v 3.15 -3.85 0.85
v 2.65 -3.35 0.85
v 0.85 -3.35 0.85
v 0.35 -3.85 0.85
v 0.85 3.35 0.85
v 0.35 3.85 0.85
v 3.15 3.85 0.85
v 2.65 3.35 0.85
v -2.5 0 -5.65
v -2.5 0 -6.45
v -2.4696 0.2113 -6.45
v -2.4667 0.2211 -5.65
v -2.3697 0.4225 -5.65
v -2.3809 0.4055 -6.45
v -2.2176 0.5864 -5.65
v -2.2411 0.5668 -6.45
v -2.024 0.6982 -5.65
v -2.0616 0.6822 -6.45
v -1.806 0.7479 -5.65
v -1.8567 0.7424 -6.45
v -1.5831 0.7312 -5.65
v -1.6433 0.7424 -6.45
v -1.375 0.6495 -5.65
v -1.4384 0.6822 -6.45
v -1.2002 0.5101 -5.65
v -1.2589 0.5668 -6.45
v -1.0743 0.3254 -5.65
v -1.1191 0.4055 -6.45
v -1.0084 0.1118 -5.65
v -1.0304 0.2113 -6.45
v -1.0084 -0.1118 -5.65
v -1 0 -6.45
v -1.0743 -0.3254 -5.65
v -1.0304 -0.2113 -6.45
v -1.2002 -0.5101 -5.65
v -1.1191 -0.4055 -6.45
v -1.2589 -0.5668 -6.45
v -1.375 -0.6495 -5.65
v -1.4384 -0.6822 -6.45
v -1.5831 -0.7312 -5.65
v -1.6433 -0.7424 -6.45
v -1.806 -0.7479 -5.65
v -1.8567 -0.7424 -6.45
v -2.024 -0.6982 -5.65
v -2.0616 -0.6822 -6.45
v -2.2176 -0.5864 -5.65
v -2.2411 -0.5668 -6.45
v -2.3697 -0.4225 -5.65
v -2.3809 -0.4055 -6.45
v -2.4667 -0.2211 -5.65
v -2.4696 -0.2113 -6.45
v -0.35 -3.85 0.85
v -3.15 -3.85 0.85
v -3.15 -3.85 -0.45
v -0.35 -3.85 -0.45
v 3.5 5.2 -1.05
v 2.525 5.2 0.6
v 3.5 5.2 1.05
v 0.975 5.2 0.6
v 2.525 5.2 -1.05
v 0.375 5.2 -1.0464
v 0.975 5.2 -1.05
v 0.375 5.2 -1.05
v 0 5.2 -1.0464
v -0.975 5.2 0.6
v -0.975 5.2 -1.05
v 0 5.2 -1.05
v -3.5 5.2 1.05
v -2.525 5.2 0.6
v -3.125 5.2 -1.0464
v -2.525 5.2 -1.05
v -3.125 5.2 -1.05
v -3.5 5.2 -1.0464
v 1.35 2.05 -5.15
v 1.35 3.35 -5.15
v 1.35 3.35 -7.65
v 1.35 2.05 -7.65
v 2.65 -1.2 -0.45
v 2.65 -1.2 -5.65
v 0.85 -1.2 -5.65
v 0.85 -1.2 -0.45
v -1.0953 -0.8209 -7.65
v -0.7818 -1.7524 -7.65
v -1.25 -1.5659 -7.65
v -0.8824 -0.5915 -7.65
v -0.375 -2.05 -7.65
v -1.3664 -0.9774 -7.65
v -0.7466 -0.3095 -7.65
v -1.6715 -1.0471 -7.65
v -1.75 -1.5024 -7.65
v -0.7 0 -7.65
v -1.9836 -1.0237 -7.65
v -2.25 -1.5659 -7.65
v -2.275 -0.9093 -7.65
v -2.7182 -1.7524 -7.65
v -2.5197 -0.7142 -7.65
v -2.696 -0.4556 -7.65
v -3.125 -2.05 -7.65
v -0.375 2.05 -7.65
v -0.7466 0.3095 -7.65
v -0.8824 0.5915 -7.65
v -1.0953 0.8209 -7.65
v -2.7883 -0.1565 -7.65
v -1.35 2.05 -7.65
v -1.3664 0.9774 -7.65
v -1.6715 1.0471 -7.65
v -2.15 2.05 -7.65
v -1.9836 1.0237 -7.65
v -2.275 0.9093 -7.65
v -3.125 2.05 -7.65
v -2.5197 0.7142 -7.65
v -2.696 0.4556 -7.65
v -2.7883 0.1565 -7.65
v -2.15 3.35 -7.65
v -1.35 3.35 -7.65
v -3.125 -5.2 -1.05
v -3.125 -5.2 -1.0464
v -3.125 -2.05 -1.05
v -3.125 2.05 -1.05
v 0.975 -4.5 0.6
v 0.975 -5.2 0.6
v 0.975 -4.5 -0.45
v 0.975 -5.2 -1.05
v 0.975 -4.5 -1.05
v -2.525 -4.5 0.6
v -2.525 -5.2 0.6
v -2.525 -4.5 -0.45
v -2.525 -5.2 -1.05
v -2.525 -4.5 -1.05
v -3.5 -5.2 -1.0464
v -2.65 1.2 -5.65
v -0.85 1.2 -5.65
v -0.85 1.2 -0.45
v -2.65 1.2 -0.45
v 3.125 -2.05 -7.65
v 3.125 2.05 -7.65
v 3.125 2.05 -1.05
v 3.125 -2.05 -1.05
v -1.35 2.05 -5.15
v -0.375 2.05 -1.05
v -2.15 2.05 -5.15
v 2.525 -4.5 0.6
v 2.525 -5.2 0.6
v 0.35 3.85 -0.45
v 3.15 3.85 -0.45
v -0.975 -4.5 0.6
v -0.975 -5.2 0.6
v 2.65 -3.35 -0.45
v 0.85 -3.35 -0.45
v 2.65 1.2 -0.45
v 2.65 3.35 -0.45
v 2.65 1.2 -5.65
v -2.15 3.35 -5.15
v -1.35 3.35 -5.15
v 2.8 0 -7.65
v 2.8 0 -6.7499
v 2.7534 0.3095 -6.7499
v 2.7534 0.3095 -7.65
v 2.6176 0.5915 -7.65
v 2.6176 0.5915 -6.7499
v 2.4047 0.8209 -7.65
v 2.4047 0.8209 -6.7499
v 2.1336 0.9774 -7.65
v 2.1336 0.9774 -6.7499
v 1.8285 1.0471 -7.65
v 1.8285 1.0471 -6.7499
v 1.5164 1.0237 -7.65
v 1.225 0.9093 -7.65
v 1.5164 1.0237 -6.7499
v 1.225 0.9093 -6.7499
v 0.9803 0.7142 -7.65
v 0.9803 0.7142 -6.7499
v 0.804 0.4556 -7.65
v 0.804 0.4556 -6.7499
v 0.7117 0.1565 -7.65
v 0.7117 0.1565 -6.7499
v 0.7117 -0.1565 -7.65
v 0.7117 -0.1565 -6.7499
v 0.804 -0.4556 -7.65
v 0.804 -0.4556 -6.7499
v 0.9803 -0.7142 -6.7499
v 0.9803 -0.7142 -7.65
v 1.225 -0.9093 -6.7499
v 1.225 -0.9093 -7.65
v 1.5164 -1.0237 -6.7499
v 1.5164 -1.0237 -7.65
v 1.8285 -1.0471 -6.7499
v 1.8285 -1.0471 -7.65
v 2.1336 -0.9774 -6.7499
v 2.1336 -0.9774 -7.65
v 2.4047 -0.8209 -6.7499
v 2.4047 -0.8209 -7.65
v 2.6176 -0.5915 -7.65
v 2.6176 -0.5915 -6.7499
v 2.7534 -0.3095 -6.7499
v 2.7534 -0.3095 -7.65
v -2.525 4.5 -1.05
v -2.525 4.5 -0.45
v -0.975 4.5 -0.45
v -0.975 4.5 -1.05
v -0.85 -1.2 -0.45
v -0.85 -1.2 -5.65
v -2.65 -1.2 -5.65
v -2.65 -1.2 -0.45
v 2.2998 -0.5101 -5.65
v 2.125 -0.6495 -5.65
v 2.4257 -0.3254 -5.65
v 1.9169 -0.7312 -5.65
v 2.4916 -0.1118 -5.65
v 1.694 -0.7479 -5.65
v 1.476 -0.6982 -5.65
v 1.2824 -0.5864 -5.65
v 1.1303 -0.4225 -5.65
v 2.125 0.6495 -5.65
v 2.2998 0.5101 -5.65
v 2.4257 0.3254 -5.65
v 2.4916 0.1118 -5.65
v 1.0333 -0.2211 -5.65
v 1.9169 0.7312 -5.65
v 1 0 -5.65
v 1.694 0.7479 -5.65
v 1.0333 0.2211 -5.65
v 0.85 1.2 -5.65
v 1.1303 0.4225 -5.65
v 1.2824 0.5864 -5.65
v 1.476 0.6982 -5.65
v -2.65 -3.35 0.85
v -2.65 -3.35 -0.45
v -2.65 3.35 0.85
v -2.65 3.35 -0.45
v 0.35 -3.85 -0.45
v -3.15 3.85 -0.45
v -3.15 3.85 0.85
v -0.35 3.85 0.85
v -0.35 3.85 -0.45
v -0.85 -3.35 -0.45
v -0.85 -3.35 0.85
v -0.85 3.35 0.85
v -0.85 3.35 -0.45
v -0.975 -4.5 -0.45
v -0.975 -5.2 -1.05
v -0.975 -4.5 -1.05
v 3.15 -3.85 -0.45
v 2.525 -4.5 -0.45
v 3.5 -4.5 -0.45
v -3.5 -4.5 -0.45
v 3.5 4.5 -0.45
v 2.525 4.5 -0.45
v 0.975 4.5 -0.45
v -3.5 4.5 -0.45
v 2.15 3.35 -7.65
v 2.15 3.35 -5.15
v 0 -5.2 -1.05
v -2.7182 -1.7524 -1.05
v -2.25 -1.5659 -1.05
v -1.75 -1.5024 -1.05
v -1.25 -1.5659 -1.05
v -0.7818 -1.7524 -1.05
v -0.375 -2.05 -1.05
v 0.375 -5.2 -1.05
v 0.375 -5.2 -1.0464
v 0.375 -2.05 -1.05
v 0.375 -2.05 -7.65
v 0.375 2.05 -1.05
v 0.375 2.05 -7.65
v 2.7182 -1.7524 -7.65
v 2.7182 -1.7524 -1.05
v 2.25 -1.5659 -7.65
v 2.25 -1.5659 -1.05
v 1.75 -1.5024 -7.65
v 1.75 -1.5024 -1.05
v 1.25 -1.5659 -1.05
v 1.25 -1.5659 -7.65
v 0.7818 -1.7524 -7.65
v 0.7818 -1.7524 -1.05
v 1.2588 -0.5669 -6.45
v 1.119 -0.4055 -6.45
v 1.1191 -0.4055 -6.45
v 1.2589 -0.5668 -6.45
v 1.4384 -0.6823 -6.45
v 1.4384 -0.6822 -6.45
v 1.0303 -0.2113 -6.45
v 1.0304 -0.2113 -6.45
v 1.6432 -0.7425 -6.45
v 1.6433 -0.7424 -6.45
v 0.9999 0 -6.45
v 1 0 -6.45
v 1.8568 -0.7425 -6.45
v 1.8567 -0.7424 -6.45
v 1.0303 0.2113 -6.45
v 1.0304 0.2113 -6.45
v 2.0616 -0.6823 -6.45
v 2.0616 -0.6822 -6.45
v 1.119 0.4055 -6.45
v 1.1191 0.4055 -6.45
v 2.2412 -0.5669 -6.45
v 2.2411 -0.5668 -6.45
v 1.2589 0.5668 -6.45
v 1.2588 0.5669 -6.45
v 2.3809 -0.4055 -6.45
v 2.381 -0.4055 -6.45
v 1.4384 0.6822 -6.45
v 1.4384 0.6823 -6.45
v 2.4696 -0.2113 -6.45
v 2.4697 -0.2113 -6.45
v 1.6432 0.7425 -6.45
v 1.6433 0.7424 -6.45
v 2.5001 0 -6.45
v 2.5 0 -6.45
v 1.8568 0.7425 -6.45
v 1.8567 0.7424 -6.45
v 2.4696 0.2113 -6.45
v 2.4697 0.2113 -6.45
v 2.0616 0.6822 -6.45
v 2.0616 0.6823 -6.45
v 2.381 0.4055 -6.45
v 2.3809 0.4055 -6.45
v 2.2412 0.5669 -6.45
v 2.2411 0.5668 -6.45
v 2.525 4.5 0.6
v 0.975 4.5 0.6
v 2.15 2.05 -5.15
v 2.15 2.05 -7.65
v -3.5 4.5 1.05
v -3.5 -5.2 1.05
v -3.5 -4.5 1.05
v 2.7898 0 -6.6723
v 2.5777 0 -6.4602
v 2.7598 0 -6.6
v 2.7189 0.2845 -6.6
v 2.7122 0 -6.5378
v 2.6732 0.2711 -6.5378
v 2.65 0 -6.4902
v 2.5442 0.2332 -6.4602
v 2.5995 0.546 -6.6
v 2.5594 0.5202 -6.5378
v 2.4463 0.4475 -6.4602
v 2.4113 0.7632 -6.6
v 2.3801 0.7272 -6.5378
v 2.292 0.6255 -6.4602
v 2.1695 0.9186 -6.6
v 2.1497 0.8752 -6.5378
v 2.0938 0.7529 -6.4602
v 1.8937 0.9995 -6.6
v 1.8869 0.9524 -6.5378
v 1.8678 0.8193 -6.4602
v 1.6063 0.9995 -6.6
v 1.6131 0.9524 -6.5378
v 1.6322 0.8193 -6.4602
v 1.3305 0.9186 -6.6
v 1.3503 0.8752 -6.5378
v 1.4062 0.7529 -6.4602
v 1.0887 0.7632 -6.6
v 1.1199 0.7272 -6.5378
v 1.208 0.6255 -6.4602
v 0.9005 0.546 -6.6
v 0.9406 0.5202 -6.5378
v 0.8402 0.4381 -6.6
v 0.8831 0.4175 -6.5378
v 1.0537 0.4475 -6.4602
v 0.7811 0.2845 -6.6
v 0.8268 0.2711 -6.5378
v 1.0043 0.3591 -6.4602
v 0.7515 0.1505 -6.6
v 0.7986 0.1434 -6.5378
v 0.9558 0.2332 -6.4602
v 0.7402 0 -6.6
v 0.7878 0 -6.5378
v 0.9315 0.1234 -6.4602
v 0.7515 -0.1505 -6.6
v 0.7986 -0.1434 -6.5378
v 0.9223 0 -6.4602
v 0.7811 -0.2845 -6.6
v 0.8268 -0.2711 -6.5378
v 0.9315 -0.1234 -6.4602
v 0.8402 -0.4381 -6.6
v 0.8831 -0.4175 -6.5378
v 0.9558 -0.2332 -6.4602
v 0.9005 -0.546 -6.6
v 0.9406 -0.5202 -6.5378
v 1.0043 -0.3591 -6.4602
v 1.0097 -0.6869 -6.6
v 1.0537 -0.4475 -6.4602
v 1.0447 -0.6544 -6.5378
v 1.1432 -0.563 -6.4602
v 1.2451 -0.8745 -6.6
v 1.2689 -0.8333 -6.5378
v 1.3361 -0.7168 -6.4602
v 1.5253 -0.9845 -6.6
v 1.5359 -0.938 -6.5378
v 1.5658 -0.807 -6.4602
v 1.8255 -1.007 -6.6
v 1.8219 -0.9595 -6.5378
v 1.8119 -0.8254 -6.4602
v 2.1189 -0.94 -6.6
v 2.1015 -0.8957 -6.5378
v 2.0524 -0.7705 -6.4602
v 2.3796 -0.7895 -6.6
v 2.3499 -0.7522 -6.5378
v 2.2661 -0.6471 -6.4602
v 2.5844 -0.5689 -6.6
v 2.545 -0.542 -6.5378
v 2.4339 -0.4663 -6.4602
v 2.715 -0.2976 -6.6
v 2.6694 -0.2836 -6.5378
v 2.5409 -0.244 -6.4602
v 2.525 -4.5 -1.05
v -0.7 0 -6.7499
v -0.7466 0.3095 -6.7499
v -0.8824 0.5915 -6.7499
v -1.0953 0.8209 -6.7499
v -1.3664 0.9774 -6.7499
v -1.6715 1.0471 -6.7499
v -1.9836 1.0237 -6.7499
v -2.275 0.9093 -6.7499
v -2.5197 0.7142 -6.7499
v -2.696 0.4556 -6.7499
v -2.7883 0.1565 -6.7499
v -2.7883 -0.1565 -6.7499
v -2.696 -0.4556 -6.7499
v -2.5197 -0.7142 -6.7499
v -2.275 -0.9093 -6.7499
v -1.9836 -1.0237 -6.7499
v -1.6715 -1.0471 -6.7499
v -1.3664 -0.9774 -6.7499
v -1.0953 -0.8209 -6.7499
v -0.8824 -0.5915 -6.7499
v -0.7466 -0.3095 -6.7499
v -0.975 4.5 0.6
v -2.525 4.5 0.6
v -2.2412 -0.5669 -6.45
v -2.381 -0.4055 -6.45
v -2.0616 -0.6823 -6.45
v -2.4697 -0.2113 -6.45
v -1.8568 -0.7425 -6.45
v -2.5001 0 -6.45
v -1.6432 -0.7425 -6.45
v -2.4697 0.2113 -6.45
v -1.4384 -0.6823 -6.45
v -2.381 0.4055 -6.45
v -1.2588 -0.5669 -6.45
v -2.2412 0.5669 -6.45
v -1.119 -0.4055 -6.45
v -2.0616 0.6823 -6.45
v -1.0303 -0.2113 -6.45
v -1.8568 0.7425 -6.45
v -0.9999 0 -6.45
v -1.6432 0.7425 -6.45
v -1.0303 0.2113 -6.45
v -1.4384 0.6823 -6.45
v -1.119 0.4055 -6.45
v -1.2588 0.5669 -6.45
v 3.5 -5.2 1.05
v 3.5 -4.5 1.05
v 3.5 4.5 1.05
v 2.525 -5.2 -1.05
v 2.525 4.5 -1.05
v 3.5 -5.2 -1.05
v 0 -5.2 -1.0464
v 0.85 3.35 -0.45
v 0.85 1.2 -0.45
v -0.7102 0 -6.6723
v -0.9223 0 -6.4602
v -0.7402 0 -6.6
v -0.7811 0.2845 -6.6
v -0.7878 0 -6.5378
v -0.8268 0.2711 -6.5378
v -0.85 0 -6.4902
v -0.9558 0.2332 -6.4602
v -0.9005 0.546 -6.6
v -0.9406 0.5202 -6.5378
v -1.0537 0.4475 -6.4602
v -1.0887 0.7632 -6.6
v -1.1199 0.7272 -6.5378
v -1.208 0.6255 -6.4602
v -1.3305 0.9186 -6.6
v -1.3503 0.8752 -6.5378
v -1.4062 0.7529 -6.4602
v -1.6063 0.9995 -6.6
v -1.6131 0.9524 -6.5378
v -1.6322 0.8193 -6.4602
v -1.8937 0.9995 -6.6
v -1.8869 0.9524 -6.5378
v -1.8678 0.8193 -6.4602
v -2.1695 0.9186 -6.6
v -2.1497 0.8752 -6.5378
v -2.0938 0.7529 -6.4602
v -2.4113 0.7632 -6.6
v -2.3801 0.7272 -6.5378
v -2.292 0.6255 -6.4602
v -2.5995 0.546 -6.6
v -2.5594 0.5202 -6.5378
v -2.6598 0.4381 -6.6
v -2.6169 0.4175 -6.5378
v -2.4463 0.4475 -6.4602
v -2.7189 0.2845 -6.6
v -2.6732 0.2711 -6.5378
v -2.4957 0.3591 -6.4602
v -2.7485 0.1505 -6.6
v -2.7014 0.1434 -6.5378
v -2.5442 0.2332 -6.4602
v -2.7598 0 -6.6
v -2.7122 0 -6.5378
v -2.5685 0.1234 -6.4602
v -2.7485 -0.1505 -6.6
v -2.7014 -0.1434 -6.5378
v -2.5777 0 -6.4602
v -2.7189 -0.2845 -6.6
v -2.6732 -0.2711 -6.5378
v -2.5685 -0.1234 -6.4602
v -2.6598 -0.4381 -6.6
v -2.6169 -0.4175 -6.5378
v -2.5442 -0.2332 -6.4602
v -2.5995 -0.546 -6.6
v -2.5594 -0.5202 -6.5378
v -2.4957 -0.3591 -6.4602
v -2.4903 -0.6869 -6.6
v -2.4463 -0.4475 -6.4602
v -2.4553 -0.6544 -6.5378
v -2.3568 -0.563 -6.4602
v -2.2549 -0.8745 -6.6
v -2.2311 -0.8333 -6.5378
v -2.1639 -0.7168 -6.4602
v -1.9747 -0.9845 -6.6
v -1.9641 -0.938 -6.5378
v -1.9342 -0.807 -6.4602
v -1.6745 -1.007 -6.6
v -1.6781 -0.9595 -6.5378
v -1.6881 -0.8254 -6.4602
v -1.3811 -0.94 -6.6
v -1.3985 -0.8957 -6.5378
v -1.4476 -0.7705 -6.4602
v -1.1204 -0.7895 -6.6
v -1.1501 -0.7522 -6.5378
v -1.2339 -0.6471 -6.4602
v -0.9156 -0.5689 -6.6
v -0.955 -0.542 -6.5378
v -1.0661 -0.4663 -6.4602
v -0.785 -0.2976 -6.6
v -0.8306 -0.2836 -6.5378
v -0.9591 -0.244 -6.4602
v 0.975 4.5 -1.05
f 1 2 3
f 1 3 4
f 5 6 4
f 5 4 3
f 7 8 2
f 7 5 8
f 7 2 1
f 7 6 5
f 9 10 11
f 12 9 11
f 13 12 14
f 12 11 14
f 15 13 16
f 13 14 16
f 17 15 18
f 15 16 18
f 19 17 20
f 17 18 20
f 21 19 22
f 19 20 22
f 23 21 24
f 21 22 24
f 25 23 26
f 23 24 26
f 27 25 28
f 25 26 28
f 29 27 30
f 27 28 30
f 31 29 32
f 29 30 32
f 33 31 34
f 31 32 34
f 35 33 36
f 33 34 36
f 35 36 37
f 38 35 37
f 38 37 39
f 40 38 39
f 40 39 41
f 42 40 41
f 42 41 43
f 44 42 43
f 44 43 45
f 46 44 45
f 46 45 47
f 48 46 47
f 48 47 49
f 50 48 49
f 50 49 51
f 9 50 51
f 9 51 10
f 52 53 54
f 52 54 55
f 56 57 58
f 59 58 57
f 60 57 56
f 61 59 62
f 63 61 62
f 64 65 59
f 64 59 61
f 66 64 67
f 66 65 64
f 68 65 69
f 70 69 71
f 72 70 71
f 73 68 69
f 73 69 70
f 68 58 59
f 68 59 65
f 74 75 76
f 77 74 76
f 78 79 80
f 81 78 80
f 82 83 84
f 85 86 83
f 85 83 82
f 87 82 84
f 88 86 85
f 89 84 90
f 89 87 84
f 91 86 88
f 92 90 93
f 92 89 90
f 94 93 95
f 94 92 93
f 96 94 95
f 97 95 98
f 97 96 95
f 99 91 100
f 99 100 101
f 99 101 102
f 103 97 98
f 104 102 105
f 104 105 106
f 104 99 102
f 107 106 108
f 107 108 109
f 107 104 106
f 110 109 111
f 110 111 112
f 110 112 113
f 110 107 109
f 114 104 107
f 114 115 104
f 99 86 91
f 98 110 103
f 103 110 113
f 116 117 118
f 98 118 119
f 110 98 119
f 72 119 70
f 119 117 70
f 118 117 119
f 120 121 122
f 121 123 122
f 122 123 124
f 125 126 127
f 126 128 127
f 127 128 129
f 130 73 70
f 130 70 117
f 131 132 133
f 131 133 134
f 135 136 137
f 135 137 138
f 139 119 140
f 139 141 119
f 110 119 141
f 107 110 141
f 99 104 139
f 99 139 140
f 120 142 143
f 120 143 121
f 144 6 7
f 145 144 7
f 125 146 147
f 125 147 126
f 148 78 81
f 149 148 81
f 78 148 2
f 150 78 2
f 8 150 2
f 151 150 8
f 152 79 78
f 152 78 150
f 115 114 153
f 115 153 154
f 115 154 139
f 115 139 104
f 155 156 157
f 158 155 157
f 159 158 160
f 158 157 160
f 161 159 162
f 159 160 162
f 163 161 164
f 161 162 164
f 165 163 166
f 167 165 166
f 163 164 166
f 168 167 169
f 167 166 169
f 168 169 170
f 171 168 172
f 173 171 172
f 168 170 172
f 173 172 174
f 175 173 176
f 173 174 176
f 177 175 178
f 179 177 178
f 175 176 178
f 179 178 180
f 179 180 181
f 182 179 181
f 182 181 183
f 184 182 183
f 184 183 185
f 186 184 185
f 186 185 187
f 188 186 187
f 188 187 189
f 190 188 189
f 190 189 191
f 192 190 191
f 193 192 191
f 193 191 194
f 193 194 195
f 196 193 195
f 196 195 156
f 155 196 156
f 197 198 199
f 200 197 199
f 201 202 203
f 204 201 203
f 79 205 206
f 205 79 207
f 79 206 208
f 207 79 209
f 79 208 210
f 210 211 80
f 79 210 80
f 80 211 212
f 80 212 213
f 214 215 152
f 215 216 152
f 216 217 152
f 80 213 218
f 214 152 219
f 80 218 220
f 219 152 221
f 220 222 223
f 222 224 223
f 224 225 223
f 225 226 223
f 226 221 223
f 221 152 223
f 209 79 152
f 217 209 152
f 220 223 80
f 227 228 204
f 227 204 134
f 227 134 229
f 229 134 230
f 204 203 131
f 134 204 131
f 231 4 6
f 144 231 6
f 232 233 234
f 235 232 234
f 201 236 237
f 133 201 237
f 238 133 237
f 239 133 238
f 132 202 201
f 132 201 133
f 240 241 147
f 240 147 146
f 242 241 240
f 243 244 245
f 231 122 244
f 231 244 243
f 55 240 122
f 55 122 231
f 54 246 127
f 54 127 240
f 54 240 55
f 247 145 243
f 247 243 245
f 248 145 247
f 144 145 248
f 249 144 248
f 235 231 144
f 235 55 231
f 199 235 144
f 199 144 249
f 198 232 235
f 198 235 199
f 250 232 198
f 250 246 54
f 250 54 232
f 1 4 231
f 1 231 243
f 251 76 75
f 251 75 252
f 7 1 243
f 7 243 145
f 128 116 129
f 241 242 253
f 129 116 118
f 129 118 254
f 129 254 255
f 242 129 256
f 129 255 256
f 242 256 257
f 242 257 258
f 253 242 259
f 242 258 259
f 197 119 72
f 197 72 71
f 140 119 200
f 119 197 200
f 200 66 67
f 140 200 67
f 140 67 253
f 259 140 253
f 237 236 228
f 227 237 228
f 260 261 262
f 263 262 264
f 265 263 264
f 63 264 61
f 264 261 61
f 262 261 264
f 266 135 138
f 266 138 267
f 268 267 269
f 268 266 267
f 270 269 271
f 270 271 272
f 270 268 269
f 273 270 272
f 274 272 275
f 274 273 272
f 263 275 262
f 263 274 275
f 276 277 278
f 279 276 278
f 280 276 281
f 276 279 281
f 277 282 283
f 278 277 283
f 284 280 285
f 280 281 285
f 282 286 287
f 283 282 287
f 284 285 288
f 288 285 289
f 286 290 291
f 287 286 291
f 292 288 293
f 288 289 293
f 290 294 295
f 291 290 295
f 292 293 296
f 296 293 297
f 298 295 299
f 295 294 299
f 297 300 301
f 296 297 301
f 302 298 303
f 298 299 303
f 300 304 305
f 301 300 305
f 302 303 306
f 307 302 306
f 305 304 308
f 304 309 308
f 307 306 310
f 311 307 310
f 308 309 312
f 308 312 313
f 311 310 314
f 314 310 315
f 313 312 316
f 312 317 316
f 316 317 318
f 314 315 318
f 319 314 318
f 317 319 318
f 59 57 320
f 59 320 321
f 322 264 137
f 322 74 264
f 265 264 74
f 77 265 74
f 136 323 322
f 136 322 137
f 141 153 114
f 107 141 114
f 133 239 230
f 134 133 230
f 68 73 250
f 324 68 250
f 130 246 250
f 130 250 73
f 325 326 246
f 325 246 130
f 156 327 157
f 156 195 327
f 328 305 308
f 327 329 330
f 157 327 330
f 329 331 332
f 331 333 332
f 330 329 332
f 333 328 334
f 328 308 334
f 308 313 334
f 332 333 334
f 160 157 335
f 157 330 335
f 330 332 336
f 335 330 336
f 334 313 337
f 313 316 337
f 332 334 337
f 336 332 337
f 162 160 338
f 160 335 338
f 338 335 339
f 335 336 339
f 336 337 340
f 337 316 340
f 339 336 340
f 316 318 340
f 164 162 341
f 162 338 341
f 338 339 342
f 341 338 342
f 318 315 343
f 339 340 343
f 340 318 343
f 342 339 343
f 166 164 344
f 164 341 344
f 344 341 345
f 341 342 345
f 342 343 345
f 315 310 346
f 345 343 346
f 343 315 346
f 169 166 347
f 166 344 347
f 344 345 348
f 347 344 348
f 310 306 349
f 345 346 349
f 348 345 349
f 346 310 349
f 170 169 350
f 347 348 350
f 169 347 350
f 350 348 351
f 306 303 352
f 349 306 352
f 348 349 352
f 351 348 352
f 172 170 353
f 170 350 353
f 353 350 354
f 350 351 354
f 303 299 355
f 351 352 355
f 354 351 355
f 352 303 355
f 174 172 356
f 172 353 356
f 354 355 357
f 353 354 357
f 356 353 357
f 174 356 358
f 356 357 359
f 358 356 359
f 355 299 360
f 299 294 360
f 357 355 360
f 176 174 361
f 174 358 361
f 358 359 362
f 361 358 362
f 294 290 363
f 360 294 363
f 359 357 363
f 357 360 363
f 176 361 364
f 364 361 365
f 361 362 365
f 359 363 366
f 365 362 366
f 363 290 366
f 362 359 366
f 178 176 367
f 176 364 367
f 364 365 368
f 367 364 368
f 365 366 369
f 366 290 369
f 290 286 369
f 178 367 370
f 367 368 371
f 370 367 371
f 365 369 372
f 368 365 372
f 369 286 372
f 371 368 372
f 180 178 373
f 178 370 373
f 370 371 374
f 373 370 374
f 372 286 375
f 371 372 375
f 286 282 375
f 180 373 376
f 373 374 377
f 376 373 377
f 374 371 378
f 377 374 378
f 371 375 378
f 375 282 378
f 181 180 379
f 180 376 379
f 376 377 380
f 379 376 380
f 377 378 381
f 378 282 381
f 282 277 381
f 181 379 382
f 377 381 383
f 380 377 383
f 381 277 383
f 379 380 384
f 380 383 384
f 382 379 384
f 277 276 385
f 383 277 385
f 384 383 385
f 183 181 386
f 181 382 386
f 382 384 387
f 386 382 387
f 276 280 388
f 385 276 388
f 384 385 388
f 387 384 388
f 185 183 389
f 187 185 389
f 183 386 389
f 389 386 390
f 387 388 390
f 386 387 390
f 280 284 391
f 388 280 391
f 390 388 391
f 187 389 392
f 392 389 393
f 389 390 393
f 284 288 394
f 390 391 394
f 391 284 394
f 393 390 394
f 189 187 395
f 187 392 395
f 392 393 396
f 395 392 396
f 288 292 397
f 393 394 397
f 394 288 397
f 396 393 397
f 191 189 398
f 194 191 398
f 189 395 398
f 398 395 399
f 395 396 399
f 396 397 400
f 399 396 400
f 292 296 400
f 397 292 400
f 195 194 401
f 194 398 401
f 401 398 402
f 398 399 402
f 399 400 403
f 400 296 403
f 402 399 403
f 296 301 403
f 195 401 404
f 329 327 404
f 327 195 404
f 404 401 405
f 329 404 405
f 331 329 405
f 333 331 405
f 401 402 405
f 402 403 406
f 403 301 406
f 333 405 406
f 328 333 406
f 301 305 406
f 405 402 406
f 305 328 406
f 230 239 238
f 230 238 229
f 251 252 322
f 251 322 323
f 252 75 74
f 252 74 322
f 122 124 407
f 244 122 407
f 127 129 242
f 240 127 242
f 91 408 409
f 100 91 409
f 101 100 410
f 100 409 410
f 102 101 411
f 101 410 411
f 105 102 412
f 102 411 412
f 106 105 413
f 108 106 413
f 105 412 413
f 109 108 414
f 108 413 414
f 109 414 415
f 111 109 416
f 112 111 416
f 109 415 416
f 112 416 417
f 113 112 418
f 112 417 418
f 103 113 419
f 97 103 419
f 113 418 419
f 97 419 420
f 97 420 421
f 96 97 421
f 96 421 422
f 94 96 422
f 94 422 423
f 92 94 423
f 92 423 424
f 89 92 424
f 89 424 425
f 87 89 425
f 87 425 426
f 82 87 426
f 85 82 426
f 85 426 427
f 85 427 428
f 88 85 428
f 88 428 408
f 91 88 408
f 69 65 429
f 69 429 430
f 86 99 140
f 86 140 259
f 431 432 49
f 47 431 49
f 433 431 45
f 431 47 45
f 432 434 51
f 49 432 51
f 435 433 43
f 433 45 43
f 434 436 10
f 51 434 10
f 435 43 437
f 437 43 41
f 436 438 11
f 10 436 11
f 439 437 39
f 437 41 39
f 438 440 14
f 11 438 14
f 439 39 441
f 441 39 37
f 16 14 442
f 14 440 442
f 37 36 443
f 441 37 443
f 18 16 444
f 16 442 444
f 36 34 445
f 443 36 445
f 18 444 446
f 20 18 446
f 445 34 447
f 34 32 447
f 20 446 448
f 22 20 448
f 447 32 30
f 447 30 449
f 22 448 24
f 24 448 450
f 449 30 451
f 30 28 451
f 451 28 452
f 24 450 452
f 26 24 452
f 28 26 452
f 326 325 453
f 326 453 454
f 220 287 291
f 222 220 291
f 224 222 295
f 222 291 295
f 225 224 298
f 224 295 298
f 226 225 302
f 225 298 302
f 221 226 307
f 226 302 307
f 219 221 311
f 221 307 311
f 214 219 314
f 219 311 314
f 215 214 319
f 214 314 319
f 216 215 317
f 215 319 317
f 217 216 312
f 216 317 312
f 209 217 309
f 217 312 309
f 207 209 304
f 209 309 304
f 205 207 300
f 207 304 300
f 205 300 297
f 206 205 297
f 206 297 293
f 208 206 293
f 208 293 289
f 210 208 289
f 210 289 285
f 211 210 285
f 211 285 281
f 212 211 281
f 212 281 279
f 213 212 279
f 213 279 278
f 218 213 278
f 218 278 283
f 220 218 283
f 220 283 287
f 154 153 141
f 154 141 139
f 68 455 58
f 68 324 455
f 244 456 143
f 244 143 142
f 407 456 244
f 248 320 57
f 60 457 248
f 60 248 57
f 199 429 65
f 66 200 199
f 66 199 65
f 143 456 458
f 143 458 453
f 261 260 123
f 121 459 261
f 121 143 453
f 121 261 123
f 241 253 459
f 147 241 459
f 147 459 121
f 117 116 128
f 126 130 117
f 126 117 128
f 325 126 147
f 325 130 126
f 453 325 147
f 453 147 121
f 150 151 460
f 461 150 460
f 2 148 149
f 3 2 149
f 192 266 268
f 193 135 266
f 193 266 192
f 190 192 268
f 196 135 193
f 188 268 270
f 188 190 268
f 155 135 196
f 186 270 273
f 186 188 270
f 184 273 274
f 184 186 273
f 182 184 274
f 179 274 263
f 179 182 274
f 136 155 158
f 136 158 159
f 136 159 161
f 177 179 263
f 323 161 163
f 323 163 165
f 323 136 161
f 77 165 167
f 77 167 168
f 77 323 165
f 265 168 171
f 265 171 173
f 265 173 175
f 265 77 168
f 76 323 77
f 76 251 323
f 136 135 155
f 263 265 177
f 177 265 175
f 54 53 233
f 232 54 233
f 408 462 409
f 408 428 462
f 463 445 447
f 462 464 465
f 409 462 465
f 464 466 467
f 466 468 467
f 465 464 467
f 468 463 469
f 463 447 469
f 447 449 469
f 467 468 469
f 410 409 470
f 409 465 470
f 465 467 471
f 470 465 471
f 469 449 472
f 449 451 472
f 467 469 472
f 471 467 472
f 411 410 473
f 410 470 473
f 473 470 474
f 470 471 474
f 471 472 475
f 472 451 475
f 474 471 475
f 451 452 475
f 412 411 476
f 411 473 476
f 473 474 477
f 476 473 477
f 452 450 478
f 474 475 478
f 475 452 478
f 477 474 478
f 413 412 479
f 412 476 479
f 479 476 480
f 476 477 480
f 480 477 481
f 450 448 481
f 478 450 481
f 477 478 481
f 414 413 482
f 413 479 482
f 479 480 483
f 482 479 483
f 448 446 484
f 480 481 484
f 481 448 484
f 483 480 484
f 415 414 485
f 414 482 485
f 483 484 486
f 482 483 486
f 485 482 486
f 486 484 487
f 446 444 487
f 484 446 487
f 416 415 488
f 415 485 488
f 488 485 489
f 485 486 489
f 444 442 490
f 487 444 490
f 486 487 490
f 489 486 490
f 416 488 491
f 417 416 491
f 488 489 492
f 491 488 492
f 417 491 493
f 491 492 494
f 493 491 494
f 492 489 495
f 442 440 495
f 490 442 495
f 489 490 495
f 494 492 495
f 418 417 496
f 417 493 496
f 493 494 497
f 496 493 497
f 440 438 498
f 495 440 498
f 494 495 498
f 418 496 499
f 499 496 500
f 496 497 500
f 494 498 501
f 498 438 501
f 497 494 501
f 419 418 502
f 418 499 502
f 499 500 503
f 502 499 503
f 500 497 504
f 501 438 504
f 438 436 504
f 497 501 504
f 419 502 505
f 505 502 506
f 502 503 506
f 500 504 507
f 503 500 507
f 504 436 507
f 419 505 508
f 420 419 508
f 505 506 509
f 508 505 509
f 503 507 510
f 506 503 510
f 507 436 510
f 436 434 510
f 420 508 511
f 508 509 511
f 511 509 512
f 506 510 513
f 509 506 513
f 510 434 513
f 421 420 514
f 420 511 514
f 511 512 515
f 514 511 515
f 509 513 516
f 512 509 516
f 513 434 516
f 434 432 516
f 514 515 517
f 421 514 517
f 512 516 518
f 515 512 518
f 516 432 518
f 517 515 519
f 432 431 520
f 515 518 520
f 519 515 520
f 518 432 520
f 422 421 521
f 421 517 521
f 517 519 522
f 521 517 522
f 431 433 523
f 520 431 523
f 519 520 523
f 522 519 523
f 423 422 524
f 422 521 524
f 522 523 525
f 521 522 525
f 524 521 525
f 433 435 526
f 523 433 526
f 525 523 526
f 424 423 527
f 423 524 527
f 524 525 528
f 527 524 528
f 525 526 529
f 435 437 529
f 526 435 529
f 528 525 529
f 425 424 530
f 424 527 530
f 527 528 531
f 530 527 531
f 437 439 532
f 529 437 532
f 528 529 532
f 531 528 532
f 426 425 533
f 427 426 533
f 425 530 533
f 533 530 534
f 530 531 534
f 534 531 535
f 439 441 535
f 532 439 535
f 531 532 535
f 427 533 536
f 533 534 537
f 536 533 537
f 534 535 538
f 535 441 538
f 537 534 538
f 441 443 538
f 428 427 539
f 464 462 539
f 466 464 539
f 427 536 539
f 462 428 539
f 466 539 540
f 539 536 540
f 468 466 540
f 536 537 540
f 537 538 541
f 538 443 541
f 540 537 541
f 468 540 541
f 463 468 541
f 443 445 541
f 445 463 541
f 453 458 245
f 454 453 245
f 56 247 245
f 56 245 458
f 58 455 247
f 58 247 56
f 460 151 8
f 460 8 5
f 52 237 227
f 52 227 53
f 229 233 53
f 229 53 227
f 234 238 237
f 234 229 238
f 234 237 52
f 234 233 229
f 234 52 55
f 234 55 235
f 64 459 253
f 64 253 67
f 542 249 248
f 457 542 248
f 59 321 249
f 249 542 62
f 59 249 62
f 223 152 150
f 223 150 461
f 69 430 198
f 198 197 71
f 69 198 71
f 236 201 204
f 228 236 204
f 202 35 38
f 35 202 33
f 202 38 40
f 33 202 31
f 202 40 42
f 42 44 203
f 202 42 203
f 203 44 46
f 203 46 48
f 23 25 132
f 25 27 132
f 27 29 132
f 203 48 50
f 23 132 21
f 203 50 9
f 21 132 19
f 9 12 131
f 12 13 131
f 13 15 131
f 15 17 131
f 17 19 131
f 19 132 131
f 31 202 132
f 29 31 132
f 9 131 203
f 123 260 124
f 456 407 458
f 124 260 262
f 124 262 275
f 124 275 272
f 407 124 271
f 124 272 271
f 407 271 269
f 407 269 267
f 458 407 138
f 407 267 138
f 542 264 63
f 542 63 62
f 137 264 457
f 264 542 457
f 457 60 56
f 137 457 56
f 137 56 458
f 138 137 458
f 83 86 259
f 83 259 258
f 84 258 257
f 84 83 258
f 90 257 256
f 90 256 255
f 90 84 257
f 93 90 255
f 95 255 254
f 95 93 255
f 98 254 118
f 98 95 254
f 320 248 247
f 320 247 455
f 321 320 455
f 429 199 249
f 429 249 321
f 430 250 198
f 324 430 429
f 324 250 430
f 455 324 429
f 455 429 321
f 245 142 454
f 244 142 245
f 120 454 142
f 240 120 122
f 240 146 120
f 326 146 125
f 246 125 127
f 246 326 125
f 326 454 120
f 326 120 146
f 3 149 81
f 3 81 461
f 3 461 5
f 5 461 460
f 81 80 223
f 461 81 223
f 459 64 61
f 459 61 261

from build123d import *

# Parameters (mm, degrees)
SKETCH_1_W                     = 3.125
SKETCH_1_H                     = 10.4
EXTRUDE_1_DEPTH                = 2.1
CUT_EXTRUDE_1_REACH            = 8.249
SKETCH_2_W                     = 6.25
SKETCH_2_H                     = 9
SKETCH_3_W                     = 1.55
SKETCH_3_H                     = 0.7
CUT_EXTRUDE_2_DEPTH            = 1.05
SKETCH_5_W                     = 1.55
SKETCH_5_H                     = 0.7
CUT_EXTRUDE_4_DEPTH            = 1.05
EXTRUDE_3_DEPTH                = 6.6
SKETCH_9_W                     = 2.8
SKETCH_9_H                     = 7.7
EXTRUDE_4_DEPTH                = 1.3
CUT_EXTRUDE_6_REACH            = 11.424
SKETCH_11_W                    = 1.8
SKETCH_11_H                    = 6.7
CUT_EXTRUDE_9_REACH            = 11.047
SKETCH_14_W                    = 1.8
SKETCH_14_H                    = 2.4
CUT_EXTRUDE_11_REACH           = 14.749
SKETCH_16_W                    = 1.55
SKETCH_16_H                    = 0.6
CUT_EXTRUDE_12_REACH           = 14.749
SKETCH_17_W                    = 1.55
SKETCH_17_H                    = 0.6
EXTRUDE_6_DEPTH                = 0.375
SKETCH_21_W                    = 0.8
SKETCH_21_H                    = 2.5
EXTRUDE_8_DEPTH                = 1.3
HOLE_WIZARD_2_1_2_1_2_D        = 2.1
HOLE_WIZARD_2_1_2_1_2_DEPTH    = 1.2
HOLE_WIZARD_1_5_1_5_1_D        = 1.5
HOLE_WIZARD_1_5_1_5_1_DEPTH    = 2.000025
FILLET_1_R                     = 0.3
PATTERN_LINEAR_1_COUNT         = 2
PATTERN_LINEAR_1_PITCH         = 3.5
FILLET_1_OF_PATTERN_LINEAR_1_R = 0.3


with BuildPart() as part:
    # Эскиз1 → Бобышка-Вытянуть1 (new body)
    with BuildSketch(Plane.XY.offset(1.05)):
        with Locations((-1.5625, 0)):
            Rectangle(SKETCH_1_W, SKETCH_1_H)
    extrude_1 = extrude(amount=-EXTRUDE_1_DEPTH)

    # Эскиз2 → Вырез-Вытянуть1 (cut, up to next)
    with BuildSketch(Plane(origin=(0, 0, -0.45), x_dir=(-1, 0, 0), z_dir=(0, 0, -1)), mode=Mode.PRIVATE) as cut_extrude_1_sk1:
        Rectangle(SKETCH_2_W, SKETCH_2_H)
    cut_extrude_1_tool1 = extrude(cut_extrude_1_sk1.sketch, amount=-CUT_EXTRUDE_1_REACH, mode=Mode.PRIVATE) & part.part
    cut_extrude_1 = cut_extrude_1_tool1.solids().sort_by_distance((0, 0, -0.45))[0]
    add(cut_extrude_1, mode=Mode.SUBTRACT)

    # Эскиз3 → Вырез-Вытянуть2 (cut)
    with BuildSketch(Plane(origin=(0, 0, -0.45), x_dir=(-1, 0, 0), z_dir=(0, 0, -1))):
        with Locations((1.75, 4.85)):
            Rectangle(SKETCH_3_W, SKETCH_3_H)
    cut_extrude_2 = extrude(amount=-CUT_EXTRUDE_2_DEPTH, mode=Mode.SUBTRACT)

    # Эскиз5 → Вырез-Вытянуть4 (cut)
    with BuildSketch(Plane(origin=(0, 0, -0.45), x_dir=(-1, 0, 0), z_dir=(0, 0, -1))):
        with Locations((1.75, -4.85)):
            Rectangle(SKETCH_5_W, SKETCH_5_H)
    cut_extrude_4 = extrude(amount=-CUT_EXTRUDE_4_DEPTH, mode=Mode.SUBTRACT)

    # Эскиз8 → Бобышка-Вытянуть3 (add)
    with BuildSketch(Plane(origin=(0, 0, -7.65), x_dir=(-1, 0, 0), z_dir=(0, 0, -1))):
        with BuildLine():
            Line((3.125, 2.05), (0.375, 2.05))
            Line((0.375, 2.05), (0.375, -2.05))
            ThreePointArc((0.375, -2.05), (1.75, -1.502368755), (3.125, -2.05))
            Line((3.125, -2.05), (3.125, 2.05))
        make_face()
    extrude_3 = extrude(amount=-EXTRUDE_3_DEPTH)

    # Эскиз9 → Бобышка-Вытянуть4 (add)
    with BuildSketch(Plane.XY.offset(0.85)):
        with Locations((-1.75, 0)):
            Rectangle(SKETCH_9_W, SKETCH_9_H)
    extrude_4 = extrude(amount=-EXTRUDE_4_DEPTH)

    # Эскиз11 → Вырез-Вытянуть6 (cut, up to next)
    with BuildSketch(Plane(origin=(0, 0, -0.45), x_dir=(-1, 0, 0), z_dir=(0, 0, -1)), mode=Mode.PRIVATE) as cut_extrude_6_sk1:
        with Locations((1.75, 0)):
            Rectangle(SKETCH_11_W, SKETCH_11_H)
    cut_extrude_6_tool1 = extrude(cut_extrude_6_sk1.sketch, amount=-CUT_EXTRUDE_6_REACH, mode=Mode.PRIVATE) & part.part
    cut_extrude_6 = cut_extrude_6_tool1.solids().sort_by_distance((-1.75, 0, -0.45))[0]
    add(cut_extrude_6, mode=Mode.SUBTRACT)

    # Эскиз14 → Вырез-Вытянуть9 (cut, up to next)
    with BuildSketch(Plane(origin=(0, 0, -5.65), x_dir=(-1, 0, 0), z_dir=(0, 0, -1)), mode=Mode.PRIVATE) as cut_extrude_9_sk1:
        with Locations((1.75, 0)):
            Rectangle(SKETCH_14_W, SKETCH_14_H)
    cut_extrude_9_tool1 = extrude(cut_extrude_9_sk1.sketch, amount=-CUT_EXTRUDE_9_REACH, mode=Mode.PRIVATE) & part.part
    cut_extrude_9 = cut_extrude_9_tool1.solids().sort_by_distance((-1.75, 0, -5.65))[0]
    add(cut_extrude_9, mode=Mode.SUBTRACT)

    # Эскиз16 → Вырез-Вытянуть11 (cut, up to next)
    with BuildSketch(Plane(origin=(0, -4.5, 0), x_dir=(1, 0, 0), z_dir=(0, 1, 0)), mode=Mode.PRIVATE) as cut_extrude_11_sk1:
        with Locations((-1.75, 0.75)):
            Rectangle(SKETCH_16_W, SKETCH_16_H)
    cut_extrude_11_tool1 = extrude(cut_extrude_11_sk1.sketch, amount=-CUT_EXTRUDE_11_REACH, mode=Mode.PRIVATE) & part.part
    cut_extrude_11 = cut_extrude_11_tool1.solids().sort_by_distance((-1.75, -4.5, -0.75))[0]
    add(cut_extrude_11, mode=Mode.SUBTRACT)

    # Эскиз17 → Вырез-Вытянуть12 (cut, up to next)
    with BuildSketch(Plane.XZ.offset(-4.5), mode=Mode.PRIVATE) as cut_extrude_12_sk1:
        with Locations((-1.75, -0.75)):
            Rectangle(SKETCH_17_W, SKETCH_17_H)
    cut_extrude_12_tool1 = extrude(cut_extrude_12_sk1.sketch, amount=-CUT_EXTRUDE_12_REACH, mode=Mode.PRIVATE) & part.part
    cut_extrude_12 = cut_extrude_12_tool1.solids().sort_by_distance((-1.75, 4.5, -0.75))[0]
    add(cut_extrude_12, mode=Mode.SUBTRACT)

    # Эскиз19 → Бобышка-Вытянуть6 (add)
    with BuildSketch(Plane(origin=(-3.5, 0, 0), x_dir=(0, -1, 0), z_dir=(-1, 0, 0))):
        Polygon((1.65, -1.046361901), (5.2, -1.046361901), (5.2, 1.05), (4.5, 1.05), (4.5, -0.45), (-4.5, -0.45), (-4.5, 1.05), (-5.2, 1.05), (-5.2, -1.046361901), align=None)
    extrude_6 = extrude(amount=-EXTRUDE_6_DEPTH)

    # Эскиз21 → Бобышка-Вытянуть8 (add)
    with BuildSketch(Plane(origin=(0, 3.35, 0), x_dir=(1, 0, 0), z_dir=(0, 1, 0))):
        with Locations((-1.75, 6.4)):
            Rectangle(SKETCH_21_W, SKETCH_21_H)
    extrude_8 = extrude(amount=-EXTRUDE_8_DEPTH)

    # Диаметр отверстия Ø2.1 (2.1)2
    with Locations(Plane(origin=(0, 0, -7.65), x_dir=(-1, 0, 0), z_dir=(0, 0, -1))):
        with Locations((1.75, 0)):
            hole_wizard_2_1_2_1_2 = Hole(HOLE_WIZARD_2_1_2_1_2_D / 2, depth=HOLE_WIZARD_2_1_2_1_2_DEPTH)

    # Диаметр отверстия Ø1.5 (1.5)1
    with Locations(Plane.XY.offset(-5.65)):
        with Locations((-1.75, 0)):
            hole_wizard_1_5_1_5_1 = Hole(HOLE_WIZARD_1_5_1_5_1_D / 2, depth=HOLE_WIZARD_1_5_1_5_1_DEPTH)

    # Скругление1
    fillet_1_edges = [part.edges().sort_by_distance(p)[0] for p in [
        (-2.8, 0, -6.45),
    ]]
    fillet(fillet_1_edges, radius=FILLET_1_R - 0.0001)  # a hair under: the kernel refuses the full size

    # Линейный массив1: Бобышка-Вытянуть1, Вырез-Вытянуть1, Вырез-Вытянуть2, Вырез-Вытянуть4, Бобышка-Вытянуть3, Бобышка-Вытянуть4, Вырез-Вытянуть6, Вырез-Вытянуть9, Вырез-Вытянуть11, Вырез-Вытянуть12, Бобышка-Вытянуть6, Бобышка-Вытянуть8, Диаметр отверстия Ø2.1 (2.1)2, Диаметр отверстия Ø1.5 (1.5)1 ×2
    with Locations(*[(i * PATTERN_LINEAR_1_PITCH, 0, 0) for i in range(1, PATTERN_LINEAR_1_COUNT)]):
        add(extrude_1)
        add(cut_extrude_1, mode=Mode.SUBTRACT)
        add(cut_extrude_2, mode=Mode.SUBTRACT)
        add(cut_extrude_4, mode=Mode.SUBTRACT)
        add(extrude_3)
        add(extrude_4)
        add(cut_extrude_6, mode=Mode.SUBTRACT)
        add(cut_extrude_9, mode=Mode.SUBTRACT)
        add(cut_extrude_11, mode=Mode.SUBTRACT)
        add(cut_extrude_12, mode=Mode.SUBTRACT)
        add(extrude_6)
        add(extrude_8)
        add(hole_wizard_2_1_2_1_2, mode=Mode.SUBTRACT)
        add(hole_wizard_1_5_1_5_1, mode=Mode.SUBTRACT)

    # Скругление1 of Линейный массив1
    fillet_1_of_pattern_linear_1_edges = [part.edges().sort_by_distance(p)[0] for p in [
        (0.7, 0, -6.45),
    ]]
    fillet(fillet_1_of_pattern_linear_1_edges, radius=FILLET_1_OF_PATTERN_LINEAR_1_R - 0.0001)  # a hair under: the kernel refuses the full size


solid = part.part
